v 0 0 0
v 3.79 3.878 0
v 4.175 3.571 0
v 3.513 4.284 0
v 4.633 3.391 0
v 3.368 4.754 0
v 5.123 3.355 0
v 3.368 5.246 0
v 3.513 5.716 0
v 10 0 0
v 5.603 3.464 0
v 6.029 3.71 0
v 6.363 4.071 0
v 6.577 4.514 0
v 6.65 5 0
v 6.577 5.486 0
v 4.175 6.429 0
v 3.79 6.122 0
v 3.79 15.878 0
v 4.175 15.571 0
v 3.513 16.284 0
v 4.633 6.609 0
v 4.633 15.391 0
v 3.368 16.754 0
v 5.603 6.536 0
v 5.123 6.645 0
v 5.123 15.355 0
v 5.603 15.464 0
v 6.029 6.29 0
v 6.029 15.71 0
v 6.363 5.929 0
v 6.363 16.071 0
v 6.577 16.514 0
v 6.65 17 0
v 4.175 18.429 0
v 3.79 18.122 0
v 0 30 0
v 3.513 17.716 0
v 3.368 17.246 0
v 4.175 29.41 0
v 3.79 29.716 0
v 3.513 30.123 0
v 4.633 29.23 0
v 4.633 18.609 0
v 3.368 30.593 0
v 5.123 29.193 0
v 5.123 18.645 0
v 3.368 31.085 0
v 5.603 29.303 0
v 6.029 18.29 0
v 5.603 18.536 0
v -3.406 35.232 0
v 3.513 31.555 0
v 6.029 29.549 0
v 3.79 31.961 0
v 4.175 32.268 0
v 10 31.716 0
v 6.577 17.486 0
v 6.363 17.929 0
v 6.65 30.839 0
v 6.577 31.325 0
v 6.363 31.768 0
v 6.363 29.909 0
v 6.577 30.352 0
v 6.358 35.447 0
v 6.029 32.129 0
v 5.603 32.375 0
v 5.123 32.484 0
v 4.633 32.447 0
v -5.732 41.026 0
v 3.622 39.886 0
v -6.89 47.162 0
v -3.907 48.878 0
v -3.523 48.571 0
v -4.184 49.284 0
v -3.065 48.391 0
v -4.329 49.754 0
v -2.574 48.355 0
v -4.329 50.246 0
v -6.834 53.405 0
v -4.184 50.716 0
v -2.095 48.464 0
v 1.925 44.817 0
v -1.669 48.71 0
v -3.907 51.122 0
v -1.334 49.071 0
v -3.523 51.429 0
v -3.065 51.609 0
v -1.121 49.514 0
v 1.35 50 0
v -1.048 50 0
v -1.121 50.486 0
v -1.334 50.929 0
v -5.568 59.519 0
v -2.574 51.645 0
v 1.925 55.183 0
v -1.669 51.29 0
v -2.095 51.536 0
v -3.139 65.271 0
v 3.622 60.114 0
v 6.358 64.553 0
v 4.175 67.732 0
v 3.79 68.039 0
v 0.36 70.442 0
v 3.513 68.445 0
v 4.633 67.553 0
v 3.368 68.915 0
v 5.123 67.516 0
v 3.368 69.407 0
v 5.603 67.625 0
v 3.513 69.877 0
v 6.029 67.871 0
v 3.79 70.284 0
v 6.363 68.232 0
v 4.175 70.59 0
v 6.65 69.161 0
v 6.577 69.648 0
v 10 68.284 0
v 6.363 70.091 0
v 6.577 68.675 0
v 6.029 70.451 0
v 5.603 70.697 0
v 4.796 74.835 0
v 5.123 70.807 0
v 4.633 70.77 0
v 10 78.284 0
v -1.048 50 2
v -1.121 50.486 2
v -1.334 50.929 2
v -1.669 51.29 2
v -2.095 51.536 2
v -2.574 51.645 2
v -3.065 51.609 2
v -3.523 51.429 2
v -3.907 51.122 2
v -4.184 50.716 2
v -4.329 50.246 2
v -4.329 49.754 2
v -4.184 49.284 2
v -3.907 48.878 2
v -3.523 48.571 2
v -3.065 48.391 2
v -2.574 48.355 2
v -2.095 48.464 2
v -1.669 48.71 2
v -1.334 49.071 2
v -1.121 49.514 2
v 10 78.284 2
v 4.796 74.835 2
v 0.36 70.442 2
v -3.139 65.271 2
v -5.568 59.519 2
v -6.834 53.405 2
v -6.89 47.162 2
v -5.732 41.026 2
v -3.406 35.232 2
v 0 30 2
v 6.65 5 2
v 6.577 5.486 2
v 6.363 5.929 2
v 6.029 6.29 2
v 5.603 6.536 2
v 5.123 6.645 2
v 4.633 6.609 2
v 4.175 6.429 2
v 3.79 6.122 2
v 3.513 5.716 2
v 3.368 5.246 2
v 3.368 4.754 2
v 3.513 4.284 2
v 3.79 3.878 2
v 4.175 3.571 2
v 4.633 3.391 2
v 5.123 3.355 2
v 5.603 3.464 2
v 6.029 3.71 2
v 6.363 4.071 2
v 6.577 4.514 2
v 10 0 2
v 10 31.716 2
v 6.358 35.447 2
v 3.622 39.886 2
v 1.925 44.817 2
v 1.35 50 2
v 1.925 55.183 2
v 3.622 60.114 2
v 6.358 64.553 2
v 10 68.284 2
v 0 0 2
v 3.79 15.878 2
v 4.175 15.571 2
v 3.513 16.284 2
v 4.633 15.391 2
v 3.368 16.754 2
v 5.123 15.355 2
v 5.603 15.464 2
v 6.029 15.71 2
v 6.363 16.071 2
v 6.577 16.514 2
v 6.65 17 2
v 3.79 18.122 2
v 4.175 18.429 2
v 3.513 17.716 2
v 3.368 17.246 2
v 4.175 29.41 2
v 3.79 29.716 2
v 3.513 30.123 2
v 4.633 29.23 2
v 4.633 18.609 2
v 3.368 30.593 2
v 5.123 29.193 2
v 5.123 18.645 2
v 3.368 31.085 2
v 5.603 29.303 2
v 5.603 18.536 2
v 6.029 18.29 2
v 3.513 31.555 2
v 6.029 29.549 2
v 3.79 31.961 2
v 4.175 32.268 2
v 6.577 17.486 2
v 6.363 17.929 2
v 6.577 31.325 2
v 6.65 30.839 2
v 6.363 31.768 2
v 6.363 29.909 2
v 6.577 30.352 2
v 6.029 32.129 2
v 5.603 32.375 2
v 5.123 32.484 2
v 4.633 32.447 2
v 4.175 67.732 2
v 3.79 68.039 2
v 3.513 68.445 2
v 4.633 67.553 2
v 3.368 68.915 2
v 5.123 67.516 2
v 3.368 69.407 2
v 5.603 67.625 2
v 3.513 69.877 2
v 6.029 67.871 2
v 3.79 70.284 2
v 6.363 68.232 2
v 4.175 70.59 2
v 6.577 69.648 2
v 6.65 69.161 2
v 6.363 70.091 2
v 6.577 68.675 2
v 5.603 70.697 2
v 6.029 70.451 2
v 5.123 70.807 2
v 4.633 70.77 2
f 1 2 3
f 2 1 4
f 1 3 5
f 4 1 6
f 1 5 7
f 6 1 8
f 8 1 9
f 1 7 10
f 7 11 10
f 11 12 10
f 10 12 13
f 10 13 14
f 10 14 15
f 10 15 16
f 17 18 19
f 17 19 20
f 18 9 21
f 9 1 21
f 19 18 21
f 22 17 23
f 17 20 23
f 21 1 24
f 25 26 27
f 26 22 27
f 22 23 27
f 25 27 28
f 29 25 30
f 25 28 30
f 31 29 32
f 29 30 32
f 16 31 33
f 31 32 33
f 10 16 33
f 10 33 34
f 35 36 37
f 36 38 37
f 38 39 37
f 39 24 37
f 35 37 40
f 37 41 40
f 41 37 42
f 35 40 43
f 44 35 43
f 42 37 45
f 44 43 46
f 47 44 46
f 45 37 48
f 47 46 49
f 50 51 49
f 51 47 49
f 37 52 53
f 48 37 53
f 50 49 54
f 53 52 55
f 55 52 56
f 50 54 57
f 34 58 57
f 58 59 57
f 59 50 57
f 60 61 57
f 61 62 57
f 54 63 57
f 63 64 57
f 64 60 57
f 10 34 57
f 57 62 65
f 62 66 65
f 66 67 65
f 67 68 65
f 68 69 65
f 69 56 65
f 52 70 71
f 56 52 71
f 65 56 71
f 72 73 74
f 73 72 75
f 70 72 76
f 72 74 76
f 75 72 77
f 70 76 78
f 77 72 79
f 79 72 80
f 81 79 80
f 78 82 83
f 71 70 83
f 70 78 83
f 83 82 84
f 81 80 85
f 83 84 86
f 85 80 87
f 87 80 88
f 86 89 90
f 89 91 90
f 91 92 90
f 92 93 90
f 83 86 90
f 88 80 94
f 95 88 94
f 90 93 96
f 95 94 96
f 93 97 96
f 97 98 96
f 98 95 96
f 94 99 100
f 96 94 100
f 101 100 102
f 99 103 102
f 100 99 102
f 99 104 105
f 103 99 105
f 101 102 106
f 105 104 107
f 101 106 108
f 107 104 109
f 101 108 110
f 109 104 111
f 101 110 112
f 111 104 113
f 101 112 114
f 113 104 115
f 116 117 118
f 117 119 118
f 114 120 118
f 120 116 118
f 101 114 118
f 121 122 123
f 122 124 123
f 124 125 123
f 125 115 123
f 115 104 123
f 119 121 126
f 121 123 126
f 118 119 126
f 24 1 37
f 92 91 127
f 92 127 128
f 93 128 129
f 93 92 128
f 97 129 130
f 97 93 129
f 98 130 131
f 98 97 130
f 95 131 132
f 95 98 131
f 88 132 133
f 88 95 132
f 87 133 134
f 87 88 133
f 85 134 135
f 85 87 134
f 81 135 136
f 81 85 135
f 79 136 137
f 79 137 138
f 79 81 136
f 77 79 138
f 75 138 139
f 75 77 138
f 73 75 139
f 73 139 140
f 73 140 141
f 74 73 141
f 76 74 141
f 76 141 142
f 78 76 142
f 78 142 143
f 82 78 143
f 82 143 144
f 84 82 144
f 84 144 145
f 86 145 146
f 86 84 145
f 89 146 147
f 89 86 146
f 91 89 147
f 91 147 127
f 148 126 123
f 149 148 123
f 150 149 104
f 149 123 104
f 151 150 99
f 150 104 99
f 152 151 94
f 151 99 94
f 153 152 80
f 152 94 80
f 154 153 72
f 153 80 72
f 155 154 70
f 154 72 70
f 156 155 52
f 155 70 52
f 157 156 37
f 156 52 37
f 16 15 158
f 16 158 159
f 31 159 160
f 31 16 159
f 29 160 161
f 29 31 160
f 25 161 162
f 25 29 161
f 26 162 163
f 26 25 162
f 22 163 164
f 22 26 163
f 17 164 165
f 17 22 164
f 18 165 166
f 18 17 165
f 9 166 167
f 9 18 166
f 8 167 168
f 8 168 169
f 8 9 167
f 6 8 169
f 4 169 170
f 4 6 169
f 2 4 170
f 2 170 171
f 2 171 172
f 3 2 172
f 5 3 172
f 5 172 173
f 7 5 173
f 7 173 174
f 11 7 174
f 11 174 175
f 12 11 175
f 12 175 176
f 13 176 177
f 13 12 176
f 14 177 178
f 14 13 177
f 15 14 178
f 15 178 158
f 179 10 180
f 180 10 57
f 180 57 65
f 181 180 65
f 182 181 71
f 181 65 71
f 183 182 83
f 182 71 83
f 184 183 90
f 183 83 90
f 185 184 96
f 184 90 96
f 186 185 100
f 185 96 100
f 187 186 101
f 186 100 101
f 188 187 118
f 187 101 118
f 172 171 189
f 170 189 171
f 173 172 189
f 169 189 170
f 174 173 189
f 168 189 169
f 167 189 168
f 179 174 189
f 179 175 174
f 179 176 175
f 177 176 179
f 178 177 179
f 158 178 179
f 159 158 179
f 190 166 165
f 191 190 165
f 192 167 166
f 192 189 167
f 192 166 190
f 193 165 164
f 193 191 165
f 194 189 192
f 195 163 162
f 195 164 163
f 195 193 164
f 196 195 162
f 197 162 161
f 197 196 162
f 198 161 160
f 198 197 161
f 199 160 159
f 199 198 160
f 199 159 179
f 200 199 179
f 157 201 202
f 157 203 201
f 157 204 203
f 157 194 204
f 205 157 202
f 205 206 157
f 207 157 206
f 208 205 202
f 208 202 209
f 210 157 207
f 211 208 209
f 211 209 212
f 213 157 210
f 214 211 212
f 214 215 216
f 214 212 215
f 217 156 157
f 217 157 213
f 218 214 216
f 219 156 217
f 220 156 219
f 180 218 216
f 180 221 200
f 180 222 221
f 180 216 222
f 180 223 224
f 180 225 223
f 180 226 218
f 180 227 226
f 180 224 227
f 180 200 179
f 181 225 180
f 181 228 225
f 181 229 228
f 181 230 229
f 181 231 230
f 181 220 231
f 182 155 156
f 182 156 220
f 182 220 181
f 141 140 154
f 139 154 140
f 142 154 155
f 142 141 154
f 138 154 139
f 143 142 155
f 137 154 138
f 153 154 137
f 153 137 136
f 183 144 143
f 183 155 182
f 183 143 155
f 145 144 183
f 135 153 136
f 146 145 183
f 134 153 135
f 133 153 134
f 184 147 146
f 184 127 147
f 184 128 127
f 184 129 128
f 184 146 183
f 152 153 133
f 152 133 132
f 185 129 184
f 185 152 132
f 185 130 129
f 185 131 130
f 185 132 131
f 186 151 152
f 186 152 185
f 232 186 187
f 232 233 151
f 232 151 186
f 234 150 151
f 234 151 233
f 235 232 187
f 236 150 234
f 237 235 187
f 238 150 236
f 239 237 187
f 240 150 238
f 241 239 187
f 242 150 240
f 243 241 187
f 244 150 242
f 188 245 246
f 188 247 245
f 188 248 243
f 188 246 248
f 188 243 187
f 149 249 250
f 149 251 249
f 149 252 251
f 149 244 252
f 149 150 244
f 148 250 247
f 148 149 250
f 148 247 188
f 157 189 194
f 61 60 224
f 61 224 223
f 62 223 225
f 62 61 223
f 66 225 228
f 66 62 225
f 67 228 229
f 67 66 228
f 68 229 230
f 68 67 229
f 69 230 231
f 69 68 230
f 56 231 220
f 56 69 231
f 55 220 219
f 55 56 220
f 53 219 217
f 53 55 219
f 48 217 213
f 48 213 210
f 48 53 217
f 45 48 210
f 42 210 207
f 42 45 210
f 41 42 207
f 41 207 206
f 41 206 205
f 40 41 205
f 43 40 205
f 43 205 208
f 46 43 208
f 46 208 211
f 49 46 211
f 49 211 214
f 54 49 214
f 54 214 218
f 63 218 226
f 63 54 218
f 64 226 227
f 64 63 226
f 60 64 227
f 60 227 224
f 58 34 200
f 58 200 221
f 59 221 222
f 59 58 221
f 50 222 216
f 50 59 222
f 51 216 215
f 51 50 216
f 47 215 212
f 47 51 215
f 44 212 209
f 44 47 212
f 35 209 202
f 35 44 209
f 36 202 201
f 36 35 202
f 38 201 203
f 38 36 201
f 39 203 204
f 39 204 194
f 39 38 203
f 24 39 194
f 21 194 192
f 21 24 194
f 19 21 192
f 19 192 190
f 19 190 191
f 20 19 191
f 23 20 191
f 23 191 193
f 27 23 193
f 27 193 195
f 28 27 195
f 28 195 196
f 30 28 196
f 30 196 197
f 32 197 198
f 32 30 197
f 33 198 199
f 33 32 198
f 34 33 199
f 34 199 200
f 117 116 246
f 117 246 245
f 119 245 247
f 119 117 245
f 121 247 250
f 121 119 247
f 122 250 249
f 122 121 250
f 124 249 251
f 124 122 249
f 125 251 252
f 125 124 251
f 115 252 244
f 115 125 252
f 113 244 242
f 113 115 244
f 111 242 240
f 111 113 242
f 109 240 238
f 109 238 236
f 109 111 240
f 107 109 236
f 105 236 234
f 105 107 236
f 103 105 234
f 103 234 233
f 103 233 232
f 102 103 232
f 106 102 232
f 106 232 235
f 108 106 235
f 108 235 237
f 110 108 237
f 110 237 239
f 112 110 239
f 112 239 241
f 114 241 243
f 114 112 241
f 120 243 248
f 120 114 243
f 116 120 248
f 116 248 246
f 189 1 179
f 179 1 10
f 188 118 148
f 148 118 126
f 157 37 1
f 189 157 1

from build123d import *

# Parameters (mm, degrees)
SKETCH_1_R      = 1.65
EXTRUDE_1_DEPTH = 2


with BuildPart() as part:
    # 草图1 → 凸台-拉伸1 (new body)
    with BuildSketch(Plane.XY):
        with BuildLine():
            Line((10, 68.284271247), (10, 78.284271247))
            ThreePointArc((10, 78.284271247), (-6.350322366, 56.492864354), (0, 30))
            Line((0, 30), (0, 0))
            Line((0, 0), (10, 0))
            Line((10, 0), (10, 31.715728753))
            ThreePointArc((10, 31.715728753), (1.350167547, 50), (10, 68.284271247))
        make_face()
        with Locations((5, 5)):
            Circle(SKETCH_1_R, mode=Mode.SUBTRACT)
        with Locations((5, 17)):
            Circle(SKETCH_1_R, mode=Mode.SUBTRACT)
        with Locations((-2.697604364, 50)):
            Circle(SKETCH_1_R, mode=Mode.SUBTRACT)
        with Locations((5, 69.161348792)):
            Circle(SKETCH_1_R, mode=Mode.SUBTRACT)
        with Locations((5, 30.838651208)):
            Circle(SKETCH_1_R, mode=Mode.SUBTRACT)
    extrude(amount=EXTRUDE_1_DEPTH)


solid = part.part
